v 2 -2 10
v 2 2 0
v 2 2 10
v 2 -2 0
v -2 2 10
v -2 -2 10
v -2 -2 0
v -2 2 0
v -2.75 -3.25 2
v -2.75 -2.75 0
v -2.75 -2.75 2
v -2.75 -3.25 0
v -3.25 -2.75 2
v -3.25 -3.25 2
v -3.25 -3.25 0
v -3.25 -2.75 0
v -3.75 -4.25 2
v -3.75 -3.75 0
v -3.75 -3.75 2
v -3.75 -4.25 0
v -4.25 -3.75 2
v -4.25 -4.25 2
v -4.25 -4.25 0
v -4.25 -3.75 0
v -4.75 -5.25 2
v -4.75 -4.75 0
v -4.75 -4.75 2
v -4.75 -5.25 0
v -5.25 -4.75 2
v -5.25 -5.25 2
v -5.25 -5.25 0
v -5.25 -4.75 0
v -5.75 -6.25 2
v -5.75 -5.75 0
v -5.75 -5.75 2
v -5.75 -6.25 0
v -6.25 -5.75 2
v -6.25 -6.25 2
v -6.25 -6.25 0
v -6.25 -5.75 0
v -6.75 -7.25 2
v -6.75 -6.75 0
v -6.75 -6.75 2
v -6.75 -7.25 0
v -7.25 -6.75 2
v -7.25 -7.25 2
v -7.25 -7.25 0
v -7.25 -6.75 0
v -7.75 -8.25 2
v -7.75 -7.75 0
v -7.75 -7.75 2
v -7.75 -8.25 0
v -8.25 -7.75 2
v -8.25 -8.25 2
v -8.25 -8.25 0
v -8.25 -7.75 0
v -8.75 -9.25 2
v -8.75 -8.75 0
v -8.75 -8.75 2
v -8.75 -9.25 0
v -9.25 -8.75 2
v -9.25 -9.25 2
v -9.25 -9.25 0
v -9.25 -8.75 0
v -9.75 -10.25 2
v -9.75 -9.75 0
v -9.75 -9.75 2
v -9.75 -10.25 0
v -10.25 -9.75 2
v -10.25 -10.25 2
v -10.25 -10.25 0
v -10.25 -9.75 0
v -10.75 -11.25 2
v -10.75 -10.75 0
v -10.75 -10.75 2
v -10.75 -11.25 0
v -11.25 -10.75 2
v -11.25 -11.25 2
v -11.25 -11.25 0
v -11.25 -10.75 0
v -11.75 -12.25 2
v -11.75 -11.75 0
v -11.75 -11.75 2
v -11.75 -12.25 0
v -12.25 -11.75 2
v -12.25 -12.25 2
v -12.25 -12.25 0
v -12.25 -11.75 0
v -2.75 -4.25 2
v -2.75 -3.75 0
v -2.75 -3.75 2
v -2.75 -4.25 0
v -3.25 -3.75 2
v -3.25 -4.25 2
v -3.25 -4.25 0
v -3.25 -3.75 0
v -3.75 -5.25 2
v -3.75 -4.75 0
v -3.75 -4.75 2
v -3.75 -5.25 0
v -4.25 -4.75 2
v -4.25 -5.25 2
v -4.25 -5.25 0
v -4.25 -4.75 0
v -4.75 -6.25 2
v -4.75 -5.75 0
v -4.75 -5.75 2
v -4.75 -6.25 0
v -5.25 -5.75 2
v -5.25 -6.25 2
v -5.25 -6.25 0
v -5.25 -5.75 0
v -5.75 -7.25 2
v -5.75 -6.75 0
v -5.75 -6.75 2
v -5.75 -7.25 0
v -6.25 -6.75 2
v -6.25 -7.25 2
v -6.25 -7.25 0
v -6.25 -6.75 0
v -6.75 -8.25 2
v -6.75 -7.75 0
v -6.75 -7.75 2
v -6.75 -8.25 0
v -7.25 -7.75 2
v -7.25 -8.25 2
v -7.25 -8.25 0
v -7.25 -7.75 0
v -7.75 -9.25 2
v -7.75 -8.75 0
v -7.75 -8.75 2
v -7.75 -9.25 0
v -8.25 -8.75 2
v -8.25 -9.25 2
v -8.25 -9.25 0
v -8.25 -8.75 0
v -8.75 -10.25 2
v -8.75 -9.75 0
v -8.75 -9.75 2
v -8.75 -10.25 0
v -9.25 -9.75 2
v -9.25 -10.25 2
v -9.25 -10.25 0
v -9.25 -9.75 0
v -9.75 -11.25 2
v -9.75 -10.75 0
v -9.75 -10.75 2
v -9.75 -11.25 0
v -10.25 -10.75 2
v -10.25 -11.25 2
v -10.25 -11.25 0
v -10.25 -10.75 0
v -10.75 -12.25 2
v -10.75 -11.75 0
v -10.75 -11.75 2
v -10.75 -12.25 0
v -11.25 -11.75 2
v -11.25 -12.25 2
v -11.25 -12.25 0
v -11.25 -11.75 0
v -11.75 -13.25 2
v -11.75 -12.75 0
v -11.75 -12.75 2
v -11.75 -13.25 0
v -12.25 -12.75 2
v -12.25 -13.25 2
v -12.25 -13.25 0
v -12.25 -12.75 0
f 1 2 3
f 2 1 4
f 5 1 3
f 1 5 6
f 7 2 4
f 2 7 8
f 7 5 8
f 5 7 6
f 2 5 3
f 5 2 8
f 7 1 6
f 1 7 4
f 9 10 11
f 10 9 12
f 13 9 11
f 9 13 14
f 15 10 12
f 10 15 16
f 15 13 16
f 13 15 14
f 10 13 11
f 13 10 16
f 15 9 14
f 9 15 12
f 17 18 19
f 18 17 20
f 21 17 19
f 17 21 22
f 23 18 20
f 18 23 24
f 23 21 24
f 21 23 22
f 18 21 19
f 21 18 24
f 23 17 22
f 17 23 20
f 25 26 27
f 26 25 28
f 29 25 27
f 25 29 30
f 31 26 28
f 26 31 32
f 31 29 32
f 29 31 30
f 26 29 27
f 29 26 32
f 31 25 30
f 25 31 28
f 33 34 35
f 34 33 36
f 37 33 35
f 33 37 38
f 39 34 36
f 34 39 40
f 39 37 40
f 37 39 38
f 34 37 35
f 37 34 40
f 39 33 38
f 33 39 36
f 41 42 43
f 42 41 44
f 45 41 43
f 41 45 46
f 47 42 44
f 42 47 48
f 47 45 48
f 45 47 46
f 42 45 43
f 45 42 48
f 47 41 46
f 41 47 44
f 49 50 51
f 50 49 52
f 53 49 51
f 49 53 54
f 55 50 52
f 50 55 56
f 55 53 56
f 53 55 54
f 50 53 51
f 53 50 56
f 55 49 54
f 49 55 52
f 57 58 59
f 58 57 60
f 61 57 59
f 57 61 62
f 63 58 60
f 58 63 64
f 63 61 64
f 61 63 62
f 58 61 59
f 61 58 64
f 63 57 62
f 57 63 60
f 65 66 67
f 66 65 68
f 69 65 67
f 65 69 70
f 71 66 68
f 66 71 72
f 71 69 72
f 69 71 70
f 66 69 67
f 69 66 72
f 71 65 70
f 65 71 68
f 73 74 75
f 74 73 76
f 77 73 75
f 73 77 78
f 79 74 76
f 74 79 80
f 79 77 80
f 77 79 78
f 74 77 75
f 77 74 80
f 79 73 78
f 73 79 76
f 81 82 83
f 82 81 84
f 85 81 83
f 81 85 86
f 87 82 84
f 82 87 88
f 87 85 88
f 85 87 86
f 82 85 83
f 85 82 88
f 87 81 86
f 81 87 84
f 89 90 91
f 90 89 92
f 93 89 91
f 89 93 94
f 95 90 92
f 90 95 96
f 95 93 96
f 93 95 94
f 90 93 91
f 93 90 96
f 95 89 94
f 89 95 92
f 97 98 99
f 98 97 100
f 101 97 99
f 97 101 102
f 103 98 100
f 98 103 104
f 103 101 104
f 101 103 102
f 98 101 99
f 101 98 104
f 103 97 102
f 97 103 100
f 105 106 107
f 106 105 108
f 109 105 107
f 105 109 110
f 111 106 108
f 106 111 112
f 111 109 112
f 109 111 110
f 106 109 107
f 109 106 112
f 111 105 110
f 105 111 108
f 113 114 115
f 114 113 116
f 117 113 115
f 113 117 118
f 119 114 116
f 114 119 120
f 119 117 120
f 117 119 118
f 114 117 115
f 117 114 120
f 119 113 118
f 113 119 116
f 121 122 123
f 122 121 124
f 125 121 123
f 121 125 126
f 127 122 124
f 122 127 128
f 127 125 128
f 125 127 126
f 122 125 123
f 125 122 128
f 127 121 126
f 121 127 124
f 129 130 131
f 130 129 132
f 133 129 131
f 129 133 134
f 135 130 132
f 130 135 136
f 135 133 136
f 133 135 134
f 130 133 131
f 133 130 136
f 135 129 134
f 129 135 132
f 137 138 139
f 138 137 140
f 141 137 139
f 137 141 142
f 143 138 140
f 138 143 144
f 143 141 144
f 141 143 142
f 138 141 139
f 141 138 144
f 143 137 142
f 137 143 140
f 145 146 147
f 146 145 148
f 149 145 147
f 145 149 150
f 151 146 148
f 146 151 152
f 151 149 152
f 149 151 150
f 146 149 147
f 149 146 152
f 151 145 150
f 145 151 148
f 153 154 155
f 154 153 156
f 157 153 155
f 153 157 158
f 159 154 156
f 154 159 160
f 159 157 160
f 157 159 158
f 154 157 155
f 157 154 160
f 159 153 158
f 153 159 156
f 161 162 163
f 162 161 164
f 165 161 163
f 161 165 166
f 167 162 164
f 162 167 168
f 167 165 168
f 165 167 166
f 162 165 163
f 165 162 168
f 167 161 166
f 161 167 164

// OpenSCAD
translate([0, 0, 5]) color([0,1,0,0.9]) cube([4, 4, 10], center=true);
translate([-3, -3, 1]) color([1,0,0]) cube([0.5, 0.5, 2], center=true);
translate([-4, -4, 1]) color([1,0,0]) cube([0.5, 0.5, 2], center=true);
translate([-5, -5, 1]) color([1,0,0]) cube([0.5, 0.5, 2], center=true);
translate([-6, -6, 1]) color([1,0,0]) cube([0.5, 0.5, 2], center=true);
translate([-7, -7, 1]) color([1,0,0]) cube([0.5, 0.5, 2], center=true);
translate([-8, -8, 1]) color([1,0,0]) cube([0.5, 0.5, 2], center=true);
translate([-9, -9, 1]) color([1,0,0]) cube([0.5, 0.5, 2], center=true);
translate([-10, -10, 1]) color([1,0,0]) cube([0.5, 0.5, 2], center=true);
translate([-11, -11, 1]) color([1,0,0]) cube([0.5, 0.5, 2], center=true);
translate([-12, -12, 1]) color([1,0,0]) cube([0.5, 0.5, 2], center=true);
translate([-3, -4, 1]) color([1,0,0]) cube([0.5, 0.5, 2], center=true);
translate([-4, -5, 1]) color([1,0,0]) cube([0.5, 0.5, 2], center=true);
translate([-5, -6, 1]) color([1,0,0]) cube([0.5, 0.5, 2], center=true);
translate([-6, -7, 1]) color([1,0,0]) cube([0.5, 0.5, 2], center=true);
translate([-7, -8, 1]) color([1,0,0]) cube([0.5, 0.5, 2], center=true);
translate([-8, -9, 1]) color([1,0,0]) cube([0.5, 0.5, 2], center=true);
translate([-9, -10, 1]) color([1,0,0]) cube([0.5, 0.5, 2], center=true);
translate([-10, -11, 1]) color([1,0,0]) cube([0.5, 0.5, 2], center=true);
translate([-11, -12, 1]) color([1,0,0]) cube([0.5, 0.5, 2], center=true);
translate([-12, -13, 1]) color([1,0,0]) cube([0.5, 0.5, 2], center=true);
